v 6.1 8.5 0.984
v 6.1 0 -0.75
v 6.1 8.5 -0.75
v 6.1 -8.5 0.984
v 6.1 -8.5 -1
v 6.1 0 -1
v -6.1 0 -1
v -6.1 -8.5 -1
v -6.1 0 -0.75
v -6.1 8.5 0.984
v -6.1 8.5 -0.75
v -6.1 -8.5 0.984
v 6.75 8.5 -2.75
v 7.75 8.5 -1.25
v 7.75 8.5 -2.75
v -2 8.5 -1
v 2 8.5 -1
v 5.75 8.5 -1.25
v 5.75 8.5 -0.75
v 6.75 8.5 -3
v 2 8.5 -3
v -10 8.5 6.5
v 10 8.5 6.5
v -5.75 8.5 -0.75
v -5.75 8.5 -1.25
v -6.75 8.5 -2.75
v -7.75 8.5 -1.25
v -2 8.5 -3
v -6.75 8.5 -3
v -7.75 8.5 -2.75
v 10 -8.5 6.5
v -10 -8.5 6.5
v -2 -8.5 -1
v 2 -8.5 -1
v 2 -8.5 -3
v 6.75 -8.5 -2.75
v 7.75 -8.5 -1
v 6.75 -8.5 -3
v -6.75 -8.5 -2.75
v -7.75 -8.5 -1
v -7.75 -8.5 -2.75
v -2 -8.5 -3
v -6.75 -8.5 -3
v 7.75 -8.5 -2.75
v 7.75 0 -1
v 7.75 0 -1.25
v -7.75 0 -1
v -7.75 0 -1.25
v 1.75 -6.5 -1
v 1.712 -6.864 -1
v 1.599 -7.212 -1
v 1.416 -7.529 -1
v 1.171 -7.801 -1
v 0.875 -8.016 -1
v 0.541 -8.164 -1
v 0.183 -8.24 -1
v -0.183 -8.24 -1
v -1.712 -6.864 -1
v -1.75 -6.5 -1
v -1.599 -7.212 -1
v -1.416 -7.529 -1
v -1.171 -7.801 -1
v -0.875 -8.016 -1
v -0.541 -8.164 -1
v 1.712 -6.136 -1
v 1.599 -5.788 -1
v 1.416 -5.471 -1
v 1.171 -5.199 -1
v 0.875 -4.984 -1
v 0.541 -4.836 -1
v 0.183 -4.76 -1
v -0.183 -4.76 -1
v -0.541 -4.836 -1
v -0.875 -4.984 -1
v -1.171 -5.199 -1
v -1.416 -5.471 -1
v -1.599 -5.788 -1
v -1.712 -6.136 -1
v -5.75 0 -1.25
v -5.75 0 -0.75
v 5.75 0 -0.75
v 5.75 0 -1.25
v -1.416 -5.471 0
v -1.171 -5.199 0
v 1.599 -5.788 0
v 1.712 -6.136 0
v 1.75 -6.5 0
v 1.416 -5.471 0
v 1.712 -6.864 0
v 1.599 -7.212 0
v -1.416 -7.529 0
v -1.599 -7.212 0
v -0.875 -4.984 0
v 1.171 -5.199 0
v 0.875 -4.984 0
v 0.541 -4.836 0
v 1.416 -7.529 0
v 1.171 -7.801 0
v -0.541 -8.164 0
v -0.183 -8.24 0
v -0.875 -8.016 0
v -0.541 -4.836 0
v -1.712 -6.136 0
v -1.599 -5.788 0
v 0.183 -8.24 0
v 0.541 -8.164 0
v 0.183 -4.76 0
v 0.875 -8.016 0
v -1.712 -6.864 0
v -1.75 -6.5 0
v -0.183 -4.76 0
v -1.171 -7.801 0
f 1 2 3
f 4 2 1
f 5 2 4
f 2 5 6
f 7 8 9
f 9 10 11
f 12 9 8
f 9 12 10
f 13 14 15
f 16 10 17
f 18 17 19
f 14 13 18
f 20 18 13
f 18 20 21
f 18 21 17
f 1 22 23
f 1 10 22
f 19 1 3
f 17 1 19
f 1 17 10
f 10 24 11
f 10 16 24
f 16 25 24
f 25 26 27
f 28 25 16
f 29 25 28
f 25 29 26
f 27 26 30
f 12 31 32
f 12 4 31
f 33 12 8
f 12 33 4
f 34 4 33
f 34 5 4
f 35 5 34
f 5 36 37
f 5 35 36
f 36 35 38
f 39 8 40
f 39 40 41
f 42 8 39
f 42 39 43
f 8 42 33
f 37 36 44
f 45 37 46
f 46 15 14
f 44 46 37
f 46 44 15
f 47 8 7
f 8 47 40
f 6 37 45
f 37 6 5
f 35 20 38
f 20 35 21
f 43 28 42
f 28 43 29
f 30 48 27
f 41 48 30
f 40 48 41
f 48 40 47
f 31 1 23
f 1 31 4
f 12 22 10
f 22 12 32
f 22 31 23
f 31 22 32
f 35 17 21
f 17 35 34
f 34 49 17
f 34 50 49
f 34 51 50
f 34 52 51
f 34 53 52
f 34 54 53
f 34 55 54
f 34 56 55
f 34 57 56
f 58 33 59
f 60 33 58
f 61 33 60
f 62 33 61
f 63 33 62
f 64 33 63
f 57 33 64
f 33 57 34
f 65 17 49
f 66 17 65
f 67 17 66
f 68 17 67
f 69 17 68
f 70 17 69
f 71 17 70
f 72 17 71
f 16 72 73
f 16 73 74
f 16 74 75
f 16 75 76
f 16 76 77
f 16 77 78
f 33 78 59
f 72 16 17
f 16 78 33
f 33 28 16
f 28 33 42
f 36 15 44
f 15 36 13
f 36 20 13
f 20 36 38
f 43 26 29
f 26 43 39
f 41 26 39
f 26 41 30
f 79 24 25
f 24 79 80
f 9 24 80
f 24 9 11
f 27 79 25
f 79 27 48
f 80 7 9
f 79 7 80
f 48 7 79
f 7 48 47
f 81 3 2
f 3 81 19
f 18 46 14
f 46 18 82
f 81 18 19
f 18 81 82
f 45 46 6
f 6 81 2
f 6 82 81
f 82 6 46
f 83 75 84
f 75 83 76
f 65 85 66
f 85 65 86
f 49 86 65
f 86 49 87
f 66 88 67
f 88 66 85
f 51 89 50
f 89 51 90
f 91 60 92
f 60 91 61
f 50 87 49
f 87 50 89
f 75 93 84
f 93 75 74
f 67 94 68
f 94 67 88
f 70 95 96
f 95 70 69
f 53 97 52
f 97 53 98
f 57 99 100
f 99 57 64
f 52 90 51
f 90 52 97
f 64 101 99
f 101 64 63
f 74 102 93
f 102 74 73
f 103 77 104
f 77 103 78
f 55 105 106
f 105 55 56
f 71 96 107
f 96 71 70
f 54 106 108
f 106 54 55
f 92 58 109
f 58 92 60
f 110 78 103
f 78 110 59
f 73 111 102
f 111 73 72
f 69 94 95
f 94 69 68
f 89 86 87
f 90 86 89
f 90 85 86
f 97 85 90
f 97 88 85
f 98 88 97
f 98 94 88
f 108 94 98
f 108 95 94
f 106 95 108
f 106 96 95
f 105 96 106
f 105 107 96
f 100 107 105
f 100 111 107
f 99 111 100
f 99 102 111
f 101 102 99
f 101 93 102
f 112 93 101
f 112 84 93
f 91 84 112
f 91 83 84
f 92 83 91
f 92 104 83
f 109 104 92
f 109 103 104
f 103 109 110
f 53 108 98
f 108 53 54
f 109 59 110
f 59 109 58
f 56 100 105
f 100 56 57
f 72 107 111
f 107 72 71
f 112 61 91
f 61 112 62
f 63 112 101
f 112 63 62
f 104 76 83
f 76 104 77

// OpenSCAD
gap =12.2;
guide=4;
flange=15.5;

depth=17;

module wedge(w,t)
{
  inside=w/2 - 1.414*t/2;
  points=[[-w/2,-t/2],[-inside,t/2],[inside,t/2],[w/2,-t/2]];
  rotate([-90,0,0])
  linear_extrude(height=depth, center=true) polygon(points);
}

difference(){
  union() {
    cube([gap,depth,2.5], center=true);
    translate([0,0,-2]) cube([flange,depth,2], center=true);
    translate([0,0,3.5]) wedge(20,6);
  }
  translate([0,0,-2]) cube([guide,depth,2], center=true);
  translate([flange/2,0,-3]) cube([2,depth,.5], center=true);
  translate([-flange/2,0,-3]) cube([2,depth,.5], center=true);

  translate([-flange/2+1,depth/4,-1]) cube([2,depth/2,.5], center=true);
  translate([+flange/2-1,depth/4,-1]) cube([2,depth/2,.5], center=true);


  // 3.5mm pin hole 15mm from back
  translate([0,depth/2-15,-3]) cylinder(r=3.5/2, h=6, center=true, $fn=30);

}
